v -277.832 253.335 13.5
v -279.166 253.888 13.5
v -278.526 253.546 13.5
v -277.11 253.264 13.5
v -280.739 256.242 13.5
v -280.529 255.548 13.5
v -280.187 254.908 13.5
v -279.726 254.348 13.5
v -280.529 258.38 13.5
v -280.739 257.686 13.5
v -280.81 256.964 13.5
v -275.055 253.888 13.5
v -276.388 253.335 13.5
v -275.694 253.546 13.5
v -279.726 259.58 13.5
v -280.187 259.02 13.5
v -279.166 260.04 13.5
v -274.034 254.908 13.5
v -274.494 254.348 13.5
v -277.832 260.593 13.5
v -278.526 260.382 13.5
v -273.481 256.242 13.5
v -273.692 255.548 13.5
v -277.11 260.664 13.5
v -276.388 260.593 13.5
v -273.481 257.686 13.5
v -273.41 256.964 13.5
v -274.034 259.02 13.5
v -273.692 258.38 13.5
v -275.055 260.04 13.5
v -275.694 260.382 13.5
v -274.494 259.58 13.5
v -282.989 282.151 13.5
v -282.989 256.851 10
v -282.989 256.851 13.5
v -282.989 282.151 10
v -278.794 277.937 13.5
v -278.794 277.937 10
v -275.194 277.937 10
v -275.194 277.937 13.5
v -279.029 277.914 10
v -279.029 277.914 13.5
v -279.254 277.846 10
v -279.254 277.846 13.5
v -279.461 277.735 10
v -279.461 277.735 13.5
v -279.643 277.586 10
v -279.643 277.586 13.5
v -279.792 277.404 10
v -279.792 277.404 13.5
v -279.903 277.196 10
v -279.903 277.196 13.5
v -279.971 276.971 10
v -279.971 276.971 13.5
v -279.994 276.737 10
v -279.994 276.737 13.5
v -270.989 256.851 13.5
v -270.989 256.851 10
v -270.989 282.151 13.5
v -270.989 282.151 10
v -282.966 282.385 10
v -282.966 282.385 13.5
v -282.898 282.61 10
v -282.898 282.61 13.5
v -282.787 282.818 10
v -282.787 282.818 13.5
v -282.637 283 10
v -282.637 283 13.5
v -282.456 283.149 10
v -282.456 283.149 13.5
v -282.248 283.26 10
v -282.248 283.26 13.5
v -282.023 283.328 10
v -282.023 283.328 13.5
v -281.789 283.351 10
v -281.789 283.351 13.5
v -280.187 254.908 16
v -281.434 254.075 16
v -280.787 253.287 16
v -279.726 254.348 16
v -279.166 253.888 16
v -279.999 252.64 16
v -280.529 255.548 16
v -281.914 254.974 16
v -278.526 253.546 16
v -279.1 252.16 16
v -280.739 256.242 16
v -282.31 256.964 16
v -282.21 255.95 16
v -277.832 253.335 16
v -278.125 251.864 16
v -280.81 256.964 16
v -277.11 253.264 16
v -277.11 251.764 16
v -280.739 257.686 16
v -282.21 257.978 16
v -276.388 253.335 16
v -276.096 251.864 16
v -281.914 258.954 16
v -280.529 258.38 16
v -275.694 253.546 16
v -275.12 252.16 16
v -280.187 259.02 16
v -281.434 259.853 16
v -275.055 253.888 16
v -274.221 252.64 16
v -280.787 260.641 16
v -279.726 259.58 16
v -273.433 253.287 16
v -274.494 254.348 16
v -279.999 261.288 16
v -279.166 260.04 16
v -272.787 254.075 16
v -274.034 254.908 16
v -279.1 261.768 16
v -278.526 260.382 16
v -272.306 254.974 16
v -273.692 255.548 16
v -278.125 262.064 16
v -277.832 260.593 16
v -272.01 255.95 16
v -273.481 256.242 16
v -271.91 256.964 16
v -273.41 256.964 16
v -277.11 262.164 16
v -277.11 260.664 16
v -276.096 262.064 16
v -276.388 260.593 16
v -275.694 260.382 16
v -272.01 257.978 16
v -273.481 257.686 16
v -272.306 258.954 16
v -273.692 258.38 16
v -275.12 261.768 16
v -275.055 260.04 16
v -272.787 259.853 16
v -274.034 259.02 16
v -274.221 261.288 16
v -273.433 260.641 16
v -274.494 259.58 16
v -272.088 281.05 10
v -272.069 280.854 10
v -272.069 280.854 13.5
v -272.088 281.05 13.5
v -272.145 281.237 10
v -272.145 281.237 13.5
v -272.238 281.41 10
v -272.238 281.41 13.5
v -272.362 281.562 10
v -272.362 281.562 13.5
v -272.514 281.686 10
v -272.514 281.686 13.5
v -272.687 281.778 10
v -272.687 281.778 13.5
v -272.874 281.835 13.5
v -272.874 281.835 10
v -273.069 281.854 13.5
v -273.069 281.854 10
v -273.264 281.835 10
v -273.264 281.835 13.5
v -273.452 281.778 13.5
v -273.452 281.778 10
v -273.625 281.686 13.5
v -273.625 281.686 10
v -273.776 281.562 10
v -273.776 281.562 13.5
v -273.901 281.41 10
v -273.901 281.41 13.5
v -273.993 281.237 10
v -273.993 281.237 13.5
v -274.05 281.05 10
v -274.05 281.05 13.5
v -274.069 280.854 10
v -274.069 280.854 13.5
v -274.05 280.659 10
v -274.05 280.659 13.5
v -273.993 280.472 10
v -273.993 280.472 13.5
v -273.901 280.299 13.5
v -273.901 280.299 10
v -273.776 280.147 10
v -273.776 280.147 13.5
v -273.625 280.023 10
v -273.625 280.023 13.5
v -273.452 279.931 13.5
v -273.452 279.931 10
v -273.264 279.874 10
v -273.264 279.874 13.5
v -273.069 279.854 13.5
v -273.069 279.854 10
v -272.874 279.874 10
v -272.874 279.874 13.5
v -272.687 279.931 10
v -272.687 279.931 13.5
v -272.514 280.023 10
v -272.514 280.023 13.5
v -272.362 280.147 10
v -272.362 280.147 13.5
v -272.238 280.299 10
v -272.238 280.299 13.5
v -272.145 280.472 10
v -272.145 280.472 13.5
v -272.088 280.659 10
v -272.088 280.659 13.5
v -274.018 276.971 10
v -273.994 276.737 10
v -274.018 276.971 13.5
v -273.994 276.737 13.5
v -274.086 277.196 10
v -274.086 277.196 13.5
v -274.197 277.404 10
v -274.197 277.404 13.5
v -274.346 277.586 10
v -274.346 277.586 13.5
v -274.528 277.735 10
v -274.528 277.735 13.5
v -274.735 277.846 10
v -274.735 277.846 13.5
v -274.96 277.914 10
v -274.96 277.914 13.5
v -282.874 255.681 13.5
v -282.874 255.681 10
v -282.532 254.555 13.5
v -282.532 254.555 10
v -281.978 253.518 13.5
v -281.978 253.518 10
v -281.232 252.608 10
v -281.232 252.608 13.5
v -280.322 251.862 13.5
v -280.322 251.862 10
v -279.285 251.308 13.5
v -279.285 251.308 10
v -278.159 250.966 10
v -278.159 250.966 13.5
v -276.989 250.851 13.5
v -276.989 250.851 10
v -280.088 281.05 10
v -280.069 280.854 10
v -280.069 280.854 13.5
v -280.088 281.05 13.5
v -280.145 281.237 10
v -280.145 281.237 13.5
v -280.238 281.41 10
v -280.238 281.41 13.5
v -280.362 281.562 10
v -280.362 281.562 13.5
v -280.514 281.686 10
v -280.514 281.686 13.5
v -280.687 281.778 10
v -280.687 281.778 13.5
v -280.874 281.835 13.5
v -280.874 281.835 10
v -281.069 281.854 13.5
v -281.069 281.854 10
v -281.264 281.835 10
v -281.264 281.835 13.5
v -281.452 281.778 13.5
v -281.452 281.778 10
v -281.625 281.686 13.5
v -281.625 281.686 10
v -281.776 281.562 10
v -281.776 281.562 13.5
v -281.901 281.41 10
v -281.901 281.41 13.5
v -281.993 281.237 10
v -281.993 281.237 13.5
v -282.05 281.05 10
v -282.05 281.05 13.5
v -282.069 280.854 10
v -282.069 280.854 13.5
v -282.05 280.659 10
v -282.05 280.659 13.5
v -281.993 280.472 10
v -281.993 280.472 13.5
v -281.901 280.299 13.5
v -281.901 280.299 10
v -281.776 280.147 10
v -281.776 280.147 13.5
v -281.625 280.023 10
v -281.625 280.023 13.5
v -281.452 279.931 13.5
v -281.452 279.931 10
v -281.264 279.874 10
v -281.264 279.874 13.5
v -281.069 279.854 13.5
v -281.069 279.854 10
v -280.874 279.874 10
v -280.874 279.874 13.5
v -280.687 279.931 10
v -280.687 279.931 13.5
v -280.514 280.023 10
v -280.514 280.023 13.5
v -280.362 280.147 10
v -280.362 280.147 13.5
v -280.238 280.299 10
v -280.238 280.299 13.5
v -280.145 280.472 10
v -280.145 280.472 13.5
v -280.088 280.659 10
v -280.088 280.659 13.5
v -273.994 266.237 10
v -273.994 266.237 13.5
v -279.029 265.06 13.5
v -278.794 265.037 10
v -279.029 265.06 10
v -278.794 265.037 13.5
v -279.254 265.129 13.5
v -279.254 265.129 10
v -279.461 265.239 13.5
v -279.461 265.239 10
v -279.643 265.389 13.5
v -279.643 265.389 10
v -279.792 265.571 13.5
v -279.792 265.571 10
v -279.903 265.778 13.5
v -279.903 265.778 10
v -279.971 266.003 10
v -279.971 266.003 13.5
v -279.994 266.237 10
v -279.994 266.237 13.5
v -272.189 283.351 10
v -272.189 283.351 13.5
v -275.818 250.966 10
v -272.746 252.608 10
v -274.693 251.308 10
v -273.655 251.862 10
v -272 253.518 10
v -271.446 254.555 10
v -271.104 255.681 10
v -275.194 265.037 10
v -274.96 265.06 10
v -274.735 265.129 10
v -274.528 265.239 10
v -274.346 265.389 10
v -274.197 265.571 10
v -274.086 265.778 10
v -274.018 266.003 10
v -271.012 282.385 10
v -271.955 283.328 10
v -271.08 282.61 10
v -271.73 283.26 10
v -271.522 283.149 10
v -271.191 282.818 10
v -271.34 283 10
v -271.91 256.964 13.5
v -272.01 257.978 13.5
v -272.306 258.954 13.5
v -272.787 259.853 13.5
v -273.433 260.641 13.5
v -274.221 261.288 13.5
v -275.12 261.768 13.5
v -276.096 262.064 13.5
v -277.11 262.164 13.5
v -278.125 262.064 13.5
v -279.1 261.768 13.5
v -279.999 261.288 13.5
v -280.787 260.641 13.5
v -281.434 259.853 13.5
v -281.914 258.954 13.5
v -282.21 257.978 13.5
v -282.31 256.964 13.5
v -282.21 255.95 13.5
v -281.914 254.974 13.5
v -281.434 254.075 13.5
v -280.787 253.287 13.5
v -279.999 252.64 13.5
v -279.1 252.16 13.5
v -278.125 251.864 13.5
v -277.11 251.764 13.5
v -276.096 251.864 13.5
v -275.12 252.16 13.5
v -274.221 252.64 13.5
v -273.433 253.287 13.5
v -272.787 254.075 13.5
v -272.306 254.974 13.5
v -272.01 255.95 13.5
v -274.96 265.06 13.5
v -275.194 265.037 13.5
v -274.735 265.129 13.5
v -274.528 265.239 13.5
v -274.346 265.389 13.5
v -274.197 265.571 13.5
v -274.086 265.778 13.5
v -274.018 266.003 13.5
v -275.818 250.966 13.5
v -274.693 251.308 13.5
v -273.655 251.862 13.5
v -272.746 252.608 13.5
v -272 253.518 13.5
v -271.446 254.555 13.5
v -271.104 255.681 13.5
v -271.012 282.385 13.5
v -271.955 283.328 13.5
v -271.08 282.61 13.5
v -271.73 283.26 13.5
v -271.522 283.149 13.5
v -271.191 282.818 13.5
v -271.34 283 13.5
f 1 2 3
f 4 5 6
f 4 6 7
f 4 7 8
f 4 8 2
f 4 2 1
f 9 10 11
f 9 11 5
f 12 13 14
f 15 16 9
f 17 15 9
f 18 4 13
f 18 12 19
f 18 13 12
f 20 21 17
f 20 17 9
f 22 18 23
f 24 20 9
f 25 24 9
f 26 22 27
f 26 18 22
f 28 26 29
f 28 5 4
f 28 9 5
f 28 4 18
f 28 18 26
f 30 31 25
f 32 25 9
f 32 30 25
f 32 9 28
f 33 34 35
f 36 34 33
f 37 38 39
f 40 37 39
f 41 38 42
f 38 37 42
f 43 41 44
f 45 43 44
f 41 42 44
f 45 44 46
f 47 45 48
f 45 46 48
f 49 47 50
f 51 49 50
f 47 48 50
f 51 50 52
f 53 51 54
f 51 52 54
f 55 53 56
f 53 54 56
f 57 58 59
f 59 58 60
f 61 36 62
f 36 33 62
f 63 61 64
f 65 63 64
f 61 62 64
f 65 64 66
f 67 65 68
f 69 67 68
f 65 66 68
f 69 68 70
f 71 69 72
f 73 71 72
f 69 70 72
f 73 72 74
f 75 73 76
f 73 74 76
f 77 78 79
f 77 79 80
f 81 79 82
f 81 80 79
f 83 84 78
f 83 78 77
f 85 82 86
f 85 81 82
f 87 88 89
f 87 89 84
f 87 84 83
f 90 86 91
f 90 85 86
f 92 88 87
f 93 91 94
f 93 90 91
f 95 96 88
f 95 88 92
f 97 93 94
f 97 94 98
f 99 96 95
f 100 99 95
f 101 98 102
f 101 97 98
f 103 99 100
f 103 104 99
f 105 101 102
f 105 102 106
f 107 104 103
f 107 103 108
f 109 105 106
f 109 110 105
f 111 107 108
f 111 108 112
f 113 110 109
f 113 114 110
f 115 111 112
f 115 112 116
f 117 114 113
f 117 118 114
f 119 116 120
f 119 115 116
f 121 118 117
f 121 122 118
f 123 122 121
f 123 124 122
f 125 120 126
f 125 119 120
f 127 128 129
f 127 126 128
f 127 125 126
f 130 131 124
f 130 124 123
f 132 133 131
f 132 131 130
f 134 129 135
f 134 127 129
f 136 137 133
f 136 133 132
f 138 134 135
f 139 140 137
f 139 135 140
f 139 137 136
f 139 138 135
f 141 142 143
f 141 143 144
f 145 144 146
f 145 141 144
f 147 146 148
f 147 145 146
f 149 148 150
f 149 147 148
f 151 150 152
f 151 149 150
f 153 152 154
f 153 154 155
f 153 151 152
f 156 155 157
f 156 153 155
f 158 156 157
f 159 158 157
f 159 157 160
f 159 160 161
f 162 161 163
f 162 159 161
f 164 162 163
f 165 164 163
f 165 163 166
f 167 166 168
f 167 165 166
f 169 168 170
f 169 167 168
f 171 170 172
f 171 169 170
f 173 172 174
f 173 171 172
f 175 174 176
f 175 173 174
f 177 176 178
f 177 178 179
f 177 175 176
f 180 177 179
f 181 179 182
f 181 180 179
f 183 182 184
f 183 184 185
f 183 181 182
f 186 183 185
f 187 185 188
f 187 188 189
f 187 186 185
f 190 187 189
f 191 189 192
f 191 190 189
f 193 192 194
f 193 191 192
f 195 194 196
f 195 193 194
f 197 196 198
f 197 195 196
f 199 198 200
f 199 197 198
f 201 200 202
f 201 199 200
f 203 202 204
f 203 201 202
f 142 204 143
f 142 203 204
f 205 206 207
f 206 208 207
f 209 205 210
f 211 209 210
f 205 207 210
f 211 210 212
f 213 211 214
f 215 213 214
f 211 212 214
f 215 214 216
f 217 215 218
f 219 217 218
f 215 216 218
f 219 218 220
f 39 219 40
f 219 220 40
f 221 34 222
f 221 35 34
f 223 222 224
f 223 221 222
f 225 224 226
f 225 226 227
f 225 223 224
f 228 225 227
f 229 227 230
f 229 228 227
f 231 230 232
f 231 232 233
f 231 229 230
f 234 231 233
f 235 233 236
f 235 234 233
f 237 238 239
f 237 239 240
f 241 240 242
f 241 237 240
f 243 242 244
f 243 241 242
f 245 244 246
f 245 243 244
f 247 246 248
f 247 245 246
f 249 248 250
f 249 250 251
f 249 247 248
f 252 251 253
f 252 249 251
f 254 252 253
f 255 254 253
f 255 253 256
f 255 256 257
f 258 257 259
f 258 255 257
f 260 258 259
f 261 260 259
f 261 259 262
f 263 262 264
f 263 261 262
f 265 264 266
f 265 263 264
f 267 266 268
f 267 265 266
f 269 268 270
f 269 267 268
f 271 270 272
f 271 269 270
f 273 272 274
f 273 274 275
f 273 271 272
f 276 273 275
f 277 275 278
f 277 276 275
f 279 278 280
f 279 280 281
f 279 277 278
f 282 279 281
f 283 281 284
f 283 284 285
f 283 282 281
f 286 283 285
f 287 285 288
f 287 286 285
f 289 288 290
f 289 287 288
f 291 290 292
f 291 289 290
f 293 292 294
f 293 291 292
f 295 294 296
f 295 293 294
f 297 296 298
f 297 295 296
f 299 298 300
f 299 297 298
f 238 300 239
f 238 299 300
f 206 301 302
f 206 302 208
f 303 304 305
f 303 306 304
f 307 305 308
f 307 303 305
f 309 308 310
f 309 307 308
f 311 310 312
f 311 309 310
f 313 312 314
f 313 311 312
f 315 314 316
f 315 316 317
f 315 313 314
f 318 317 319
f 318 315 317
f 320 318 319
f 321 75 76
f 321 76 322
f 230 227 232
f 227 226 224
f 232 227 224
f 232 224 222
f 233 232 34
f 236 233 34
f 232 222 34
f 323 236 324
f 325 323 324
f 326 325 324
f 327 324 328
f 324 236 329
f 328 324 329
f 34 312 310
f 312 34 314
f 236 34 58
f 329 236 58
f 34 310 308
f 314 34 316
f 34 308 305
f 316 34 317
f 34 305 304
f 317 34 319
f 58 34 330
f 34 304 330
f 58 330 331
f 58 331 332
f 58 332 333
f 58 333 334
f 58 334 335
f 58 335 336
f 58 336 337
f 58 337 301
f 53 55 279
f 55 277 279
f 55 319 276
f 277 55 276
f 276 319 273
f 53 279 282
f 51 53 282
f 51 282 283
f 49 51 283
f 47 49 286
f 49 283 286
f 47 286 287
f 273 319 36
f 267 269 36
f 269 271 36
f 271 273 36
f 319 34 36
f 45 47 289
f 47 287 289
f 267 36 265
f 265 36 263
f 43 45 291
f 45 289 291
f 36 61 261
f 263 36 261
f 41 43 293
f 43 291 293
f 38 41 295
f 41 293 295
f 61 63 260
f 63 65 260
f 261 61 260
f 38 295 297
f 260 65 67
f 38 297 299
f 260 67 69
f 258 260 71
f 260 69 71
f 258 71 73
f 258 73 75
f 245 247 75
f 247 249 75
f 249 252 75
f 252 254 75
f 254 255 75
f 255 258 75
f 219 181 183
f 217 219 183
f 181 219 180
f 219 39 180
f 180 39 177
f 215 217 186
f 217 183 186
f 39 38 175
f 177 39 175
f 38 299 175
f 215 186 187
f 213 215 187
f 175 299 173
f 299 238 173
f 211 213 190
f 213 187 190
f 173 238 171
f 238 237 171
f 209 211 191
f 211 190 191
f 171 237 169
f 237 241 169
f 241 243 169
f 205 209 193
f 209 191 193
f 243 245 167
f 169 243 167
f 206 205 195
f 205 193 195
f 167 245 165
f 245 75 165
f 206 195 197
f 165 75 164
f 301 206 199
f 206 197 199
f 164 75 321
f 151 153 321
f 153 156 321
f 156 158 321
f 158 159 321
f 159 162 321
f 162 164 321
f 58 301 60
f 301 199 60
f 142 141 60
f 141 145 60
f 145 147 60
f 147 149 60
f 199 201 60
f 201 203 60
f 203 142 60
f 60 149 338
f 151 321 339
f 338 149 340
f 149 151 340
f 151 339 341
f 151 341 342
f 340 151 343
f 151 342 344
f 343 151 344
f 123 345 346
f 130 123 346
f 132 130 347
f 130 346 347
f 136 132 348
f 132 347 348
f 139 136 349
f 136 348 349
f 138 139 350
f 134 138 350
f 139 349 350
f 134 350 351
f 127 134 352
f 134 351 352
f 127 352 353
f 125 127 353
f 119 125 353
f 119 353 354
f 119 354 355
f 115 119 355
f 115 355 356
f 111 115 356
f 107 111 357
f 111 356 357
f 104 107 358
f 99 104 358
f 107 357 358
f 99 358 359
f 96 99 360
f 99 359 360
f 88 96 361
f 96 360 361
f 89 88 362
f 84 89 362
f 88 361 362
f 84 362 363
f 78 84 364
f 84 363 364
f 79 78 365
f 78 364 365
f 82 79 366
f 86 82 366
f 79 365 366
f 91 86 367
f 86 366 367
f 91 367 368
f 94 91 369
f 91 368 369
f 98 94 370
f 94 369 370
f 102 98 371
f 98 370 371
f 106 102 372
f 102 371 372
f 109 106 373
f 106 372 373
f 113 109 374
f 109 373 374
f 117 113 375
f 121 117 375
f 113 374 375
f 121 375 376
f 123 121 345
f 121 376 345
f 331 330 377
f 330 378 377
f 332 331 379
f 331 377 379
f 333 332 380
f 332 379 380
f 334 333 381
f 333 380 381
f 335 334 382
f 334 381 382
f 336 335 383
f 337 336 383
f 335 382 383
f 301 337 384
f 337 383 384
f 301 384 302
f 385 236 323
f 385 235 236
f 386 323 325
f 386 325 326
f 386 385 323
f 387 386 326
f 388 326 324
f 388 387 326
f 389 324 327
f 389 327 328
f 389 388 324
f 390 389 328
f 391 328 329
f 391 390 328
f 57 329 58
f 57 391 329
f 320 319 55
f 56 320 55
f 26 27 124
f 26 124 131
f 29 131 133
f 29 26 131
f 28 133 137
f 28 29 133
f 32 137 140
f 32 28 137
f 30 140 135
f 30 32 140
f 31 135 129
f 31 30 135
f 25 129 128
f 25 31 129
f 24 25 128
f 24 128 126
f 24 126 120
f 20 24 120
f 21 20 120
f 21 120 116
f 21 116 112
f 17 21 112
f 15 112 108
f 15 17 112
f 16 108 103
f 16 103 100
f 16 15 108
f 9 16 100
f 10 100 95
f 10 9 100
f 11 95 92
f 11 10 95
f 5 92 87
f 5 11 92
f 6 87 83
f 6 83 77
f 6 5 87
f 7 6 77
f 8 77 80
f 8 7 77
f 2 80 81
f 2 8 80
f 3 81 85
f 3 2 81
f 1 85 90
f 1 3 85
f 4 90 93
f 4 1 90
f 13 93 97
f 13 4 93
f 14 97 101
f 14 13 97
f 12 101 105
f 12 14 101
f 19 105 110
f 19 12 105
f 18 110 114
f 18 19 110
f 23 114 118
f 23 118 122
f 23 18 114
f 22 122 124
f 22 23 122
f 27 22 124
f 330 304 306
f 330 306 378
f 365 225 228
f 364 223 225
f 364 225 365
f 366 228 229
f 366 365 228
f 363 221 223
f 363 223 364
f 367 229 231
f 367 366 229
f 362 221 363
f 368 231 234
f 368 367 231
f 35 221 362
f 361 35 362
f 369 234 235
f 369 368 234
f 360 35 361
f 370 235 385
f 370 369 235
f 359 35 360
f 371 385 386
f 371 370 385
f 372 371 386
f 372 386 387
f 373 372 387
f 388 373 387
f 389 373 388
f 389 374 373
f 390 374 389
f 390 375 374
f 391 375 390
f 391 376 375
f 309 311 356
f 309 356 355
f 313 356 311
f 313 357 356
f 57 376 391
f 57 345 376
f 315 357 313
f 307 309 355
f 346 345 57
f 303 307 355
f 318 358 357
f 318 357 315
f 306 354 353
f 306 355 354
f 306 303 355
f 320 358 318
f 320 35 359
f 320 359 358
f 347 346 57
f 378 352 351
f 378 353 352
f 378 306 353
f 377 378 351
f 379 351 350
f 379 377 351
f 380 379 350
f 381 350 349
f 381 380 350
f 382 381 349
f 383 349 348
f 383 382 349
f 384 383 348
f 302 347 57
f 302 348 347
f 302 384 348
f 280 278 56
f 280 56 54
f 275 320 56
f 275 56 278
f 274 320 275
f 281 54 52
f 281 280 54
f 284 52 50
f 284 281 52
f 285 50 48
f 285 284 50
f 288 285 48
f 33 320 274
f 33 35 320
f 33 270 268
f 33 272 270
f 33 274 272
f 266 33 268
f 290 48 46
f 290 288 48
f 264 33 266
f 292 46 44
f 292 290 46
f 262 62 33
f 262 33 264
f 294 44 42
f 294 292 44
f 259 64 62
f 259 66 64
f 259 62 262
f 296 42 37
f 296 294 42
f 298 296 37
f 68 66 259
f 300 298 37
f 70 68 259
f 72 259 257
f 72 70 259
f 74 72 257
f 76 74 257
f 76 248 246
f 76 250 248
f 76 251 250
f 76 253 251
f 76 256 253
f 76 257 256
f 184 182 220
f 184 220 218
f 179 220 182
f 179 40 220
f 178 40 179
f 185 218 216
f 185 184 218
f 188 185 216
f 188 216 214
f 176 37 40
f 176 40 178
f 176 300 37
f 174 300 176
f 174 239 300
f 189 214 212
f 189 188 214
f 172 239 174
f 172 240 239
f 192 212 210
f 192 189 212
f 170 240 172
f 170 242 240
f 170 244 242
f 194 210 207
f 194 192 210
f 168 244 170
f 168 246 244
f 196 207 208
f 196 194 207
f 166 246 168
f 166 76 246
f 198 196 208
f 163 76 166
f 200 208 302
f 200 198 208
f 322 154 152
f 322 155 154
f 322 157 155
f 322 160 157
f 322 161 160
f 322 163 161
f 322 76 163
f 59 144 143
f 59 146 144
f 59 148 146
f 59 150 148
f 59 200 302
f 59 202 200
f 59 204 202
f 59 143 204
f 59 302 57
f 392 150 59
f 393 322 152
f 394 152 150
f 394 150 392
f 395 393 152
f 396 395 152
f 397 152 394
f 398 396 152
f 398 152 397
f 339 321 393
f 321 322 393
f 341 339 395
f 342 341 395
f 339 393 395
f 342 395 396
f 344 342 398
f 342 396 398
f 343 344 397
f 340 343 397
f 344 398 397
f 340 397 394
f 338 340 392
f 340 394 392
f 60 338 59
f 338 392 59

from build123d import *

# Parameters (mm, degrees)
SKETCH1_W           = 12
SKETCH1_H           = 32.5
SKETCH1_R           = 1
SKETCH1_W_2         = 6
SKETCH1_H_2         = 12.9
BOSS_EXTRUDE1_DEPTH = 3.5
FILLET1_R           = 1.2
FILLET2_R           = 6
SKETCH2_R           = 5.2
SKETCH2_R_2         = 3.7
BOSS_EXTRUDE2_DEPTH = 2.5


with BuildPart() as part:
    # Sketch1 → Boss-Extrude1 (new body)
    with BuildSketch(Plane.XY.offset(10)):
        with Locations((-276.988860295, 267.101135254)):
            Rectangle(SKETCH1_W, SKETCH1_H)
        with Locations((-281.069234982, 280.854420413)):
            Circle(SKETCH1_R, mode=Mode.SUBTRACT)
        with Locations((-273.069234982, 280.854420413)):
            Circle(SKETCH1_R, mode=Mode.SUBTRACT)
        with Locations((-276.994472892, 271.487209026)):
            Rectangle(SKETCH1_W_2, SKETCH1_H_2, mode=Mode.SUBTRACT)
    extrude(amount=BOSS_EXTRUDE1_DEPTH)

    # Fillet1
    fillet1_edges = [part.edges().sort_by_distance(p)[0] for p in [
        (-279.994472892, 277.937209026, 11.75),
        (-279.994472892, 265.037209026, 11.75),
        (-273.994472892, 265.037209026, 11.75),
        (-273.994472892, 277.937209026, 11.75),
        (-282.988860295, 283.351135254, 11.75),
        (-270.988860295, 283.351135254, 11.75),
    ]]
    fillet(fillet1_edges, radius=FILLET1_R)

    # Fillet2
    fillet2_edges = [part.edges().sort_by_distance(p)[0] for p in [
        (-282.988860295, 250.851135254, 11.75),
        (-270.988860295, 250.851135254, 11.75),
    ]]
    fillet(fillet2_edges, radius=FILLET2_R - 0.0001)  # a hair under: the kernel refuses the full size

    # Sketch2 → Boss-Extrude2 (add)
    with BuildSketch(Plane.XY.offset(13.5)):
        with Locations((-277.110164077, 256.96399239)):
            Circle(SKETCH2_R)
        with Locations((-277.110164077, 256.96399239)):
            Circle(SKETCH2_R_2, mode=Mode.SUBTRACT)
    extrude(amount=BOSS_EXTRUDE2_DEPTH)


solid = part.part
